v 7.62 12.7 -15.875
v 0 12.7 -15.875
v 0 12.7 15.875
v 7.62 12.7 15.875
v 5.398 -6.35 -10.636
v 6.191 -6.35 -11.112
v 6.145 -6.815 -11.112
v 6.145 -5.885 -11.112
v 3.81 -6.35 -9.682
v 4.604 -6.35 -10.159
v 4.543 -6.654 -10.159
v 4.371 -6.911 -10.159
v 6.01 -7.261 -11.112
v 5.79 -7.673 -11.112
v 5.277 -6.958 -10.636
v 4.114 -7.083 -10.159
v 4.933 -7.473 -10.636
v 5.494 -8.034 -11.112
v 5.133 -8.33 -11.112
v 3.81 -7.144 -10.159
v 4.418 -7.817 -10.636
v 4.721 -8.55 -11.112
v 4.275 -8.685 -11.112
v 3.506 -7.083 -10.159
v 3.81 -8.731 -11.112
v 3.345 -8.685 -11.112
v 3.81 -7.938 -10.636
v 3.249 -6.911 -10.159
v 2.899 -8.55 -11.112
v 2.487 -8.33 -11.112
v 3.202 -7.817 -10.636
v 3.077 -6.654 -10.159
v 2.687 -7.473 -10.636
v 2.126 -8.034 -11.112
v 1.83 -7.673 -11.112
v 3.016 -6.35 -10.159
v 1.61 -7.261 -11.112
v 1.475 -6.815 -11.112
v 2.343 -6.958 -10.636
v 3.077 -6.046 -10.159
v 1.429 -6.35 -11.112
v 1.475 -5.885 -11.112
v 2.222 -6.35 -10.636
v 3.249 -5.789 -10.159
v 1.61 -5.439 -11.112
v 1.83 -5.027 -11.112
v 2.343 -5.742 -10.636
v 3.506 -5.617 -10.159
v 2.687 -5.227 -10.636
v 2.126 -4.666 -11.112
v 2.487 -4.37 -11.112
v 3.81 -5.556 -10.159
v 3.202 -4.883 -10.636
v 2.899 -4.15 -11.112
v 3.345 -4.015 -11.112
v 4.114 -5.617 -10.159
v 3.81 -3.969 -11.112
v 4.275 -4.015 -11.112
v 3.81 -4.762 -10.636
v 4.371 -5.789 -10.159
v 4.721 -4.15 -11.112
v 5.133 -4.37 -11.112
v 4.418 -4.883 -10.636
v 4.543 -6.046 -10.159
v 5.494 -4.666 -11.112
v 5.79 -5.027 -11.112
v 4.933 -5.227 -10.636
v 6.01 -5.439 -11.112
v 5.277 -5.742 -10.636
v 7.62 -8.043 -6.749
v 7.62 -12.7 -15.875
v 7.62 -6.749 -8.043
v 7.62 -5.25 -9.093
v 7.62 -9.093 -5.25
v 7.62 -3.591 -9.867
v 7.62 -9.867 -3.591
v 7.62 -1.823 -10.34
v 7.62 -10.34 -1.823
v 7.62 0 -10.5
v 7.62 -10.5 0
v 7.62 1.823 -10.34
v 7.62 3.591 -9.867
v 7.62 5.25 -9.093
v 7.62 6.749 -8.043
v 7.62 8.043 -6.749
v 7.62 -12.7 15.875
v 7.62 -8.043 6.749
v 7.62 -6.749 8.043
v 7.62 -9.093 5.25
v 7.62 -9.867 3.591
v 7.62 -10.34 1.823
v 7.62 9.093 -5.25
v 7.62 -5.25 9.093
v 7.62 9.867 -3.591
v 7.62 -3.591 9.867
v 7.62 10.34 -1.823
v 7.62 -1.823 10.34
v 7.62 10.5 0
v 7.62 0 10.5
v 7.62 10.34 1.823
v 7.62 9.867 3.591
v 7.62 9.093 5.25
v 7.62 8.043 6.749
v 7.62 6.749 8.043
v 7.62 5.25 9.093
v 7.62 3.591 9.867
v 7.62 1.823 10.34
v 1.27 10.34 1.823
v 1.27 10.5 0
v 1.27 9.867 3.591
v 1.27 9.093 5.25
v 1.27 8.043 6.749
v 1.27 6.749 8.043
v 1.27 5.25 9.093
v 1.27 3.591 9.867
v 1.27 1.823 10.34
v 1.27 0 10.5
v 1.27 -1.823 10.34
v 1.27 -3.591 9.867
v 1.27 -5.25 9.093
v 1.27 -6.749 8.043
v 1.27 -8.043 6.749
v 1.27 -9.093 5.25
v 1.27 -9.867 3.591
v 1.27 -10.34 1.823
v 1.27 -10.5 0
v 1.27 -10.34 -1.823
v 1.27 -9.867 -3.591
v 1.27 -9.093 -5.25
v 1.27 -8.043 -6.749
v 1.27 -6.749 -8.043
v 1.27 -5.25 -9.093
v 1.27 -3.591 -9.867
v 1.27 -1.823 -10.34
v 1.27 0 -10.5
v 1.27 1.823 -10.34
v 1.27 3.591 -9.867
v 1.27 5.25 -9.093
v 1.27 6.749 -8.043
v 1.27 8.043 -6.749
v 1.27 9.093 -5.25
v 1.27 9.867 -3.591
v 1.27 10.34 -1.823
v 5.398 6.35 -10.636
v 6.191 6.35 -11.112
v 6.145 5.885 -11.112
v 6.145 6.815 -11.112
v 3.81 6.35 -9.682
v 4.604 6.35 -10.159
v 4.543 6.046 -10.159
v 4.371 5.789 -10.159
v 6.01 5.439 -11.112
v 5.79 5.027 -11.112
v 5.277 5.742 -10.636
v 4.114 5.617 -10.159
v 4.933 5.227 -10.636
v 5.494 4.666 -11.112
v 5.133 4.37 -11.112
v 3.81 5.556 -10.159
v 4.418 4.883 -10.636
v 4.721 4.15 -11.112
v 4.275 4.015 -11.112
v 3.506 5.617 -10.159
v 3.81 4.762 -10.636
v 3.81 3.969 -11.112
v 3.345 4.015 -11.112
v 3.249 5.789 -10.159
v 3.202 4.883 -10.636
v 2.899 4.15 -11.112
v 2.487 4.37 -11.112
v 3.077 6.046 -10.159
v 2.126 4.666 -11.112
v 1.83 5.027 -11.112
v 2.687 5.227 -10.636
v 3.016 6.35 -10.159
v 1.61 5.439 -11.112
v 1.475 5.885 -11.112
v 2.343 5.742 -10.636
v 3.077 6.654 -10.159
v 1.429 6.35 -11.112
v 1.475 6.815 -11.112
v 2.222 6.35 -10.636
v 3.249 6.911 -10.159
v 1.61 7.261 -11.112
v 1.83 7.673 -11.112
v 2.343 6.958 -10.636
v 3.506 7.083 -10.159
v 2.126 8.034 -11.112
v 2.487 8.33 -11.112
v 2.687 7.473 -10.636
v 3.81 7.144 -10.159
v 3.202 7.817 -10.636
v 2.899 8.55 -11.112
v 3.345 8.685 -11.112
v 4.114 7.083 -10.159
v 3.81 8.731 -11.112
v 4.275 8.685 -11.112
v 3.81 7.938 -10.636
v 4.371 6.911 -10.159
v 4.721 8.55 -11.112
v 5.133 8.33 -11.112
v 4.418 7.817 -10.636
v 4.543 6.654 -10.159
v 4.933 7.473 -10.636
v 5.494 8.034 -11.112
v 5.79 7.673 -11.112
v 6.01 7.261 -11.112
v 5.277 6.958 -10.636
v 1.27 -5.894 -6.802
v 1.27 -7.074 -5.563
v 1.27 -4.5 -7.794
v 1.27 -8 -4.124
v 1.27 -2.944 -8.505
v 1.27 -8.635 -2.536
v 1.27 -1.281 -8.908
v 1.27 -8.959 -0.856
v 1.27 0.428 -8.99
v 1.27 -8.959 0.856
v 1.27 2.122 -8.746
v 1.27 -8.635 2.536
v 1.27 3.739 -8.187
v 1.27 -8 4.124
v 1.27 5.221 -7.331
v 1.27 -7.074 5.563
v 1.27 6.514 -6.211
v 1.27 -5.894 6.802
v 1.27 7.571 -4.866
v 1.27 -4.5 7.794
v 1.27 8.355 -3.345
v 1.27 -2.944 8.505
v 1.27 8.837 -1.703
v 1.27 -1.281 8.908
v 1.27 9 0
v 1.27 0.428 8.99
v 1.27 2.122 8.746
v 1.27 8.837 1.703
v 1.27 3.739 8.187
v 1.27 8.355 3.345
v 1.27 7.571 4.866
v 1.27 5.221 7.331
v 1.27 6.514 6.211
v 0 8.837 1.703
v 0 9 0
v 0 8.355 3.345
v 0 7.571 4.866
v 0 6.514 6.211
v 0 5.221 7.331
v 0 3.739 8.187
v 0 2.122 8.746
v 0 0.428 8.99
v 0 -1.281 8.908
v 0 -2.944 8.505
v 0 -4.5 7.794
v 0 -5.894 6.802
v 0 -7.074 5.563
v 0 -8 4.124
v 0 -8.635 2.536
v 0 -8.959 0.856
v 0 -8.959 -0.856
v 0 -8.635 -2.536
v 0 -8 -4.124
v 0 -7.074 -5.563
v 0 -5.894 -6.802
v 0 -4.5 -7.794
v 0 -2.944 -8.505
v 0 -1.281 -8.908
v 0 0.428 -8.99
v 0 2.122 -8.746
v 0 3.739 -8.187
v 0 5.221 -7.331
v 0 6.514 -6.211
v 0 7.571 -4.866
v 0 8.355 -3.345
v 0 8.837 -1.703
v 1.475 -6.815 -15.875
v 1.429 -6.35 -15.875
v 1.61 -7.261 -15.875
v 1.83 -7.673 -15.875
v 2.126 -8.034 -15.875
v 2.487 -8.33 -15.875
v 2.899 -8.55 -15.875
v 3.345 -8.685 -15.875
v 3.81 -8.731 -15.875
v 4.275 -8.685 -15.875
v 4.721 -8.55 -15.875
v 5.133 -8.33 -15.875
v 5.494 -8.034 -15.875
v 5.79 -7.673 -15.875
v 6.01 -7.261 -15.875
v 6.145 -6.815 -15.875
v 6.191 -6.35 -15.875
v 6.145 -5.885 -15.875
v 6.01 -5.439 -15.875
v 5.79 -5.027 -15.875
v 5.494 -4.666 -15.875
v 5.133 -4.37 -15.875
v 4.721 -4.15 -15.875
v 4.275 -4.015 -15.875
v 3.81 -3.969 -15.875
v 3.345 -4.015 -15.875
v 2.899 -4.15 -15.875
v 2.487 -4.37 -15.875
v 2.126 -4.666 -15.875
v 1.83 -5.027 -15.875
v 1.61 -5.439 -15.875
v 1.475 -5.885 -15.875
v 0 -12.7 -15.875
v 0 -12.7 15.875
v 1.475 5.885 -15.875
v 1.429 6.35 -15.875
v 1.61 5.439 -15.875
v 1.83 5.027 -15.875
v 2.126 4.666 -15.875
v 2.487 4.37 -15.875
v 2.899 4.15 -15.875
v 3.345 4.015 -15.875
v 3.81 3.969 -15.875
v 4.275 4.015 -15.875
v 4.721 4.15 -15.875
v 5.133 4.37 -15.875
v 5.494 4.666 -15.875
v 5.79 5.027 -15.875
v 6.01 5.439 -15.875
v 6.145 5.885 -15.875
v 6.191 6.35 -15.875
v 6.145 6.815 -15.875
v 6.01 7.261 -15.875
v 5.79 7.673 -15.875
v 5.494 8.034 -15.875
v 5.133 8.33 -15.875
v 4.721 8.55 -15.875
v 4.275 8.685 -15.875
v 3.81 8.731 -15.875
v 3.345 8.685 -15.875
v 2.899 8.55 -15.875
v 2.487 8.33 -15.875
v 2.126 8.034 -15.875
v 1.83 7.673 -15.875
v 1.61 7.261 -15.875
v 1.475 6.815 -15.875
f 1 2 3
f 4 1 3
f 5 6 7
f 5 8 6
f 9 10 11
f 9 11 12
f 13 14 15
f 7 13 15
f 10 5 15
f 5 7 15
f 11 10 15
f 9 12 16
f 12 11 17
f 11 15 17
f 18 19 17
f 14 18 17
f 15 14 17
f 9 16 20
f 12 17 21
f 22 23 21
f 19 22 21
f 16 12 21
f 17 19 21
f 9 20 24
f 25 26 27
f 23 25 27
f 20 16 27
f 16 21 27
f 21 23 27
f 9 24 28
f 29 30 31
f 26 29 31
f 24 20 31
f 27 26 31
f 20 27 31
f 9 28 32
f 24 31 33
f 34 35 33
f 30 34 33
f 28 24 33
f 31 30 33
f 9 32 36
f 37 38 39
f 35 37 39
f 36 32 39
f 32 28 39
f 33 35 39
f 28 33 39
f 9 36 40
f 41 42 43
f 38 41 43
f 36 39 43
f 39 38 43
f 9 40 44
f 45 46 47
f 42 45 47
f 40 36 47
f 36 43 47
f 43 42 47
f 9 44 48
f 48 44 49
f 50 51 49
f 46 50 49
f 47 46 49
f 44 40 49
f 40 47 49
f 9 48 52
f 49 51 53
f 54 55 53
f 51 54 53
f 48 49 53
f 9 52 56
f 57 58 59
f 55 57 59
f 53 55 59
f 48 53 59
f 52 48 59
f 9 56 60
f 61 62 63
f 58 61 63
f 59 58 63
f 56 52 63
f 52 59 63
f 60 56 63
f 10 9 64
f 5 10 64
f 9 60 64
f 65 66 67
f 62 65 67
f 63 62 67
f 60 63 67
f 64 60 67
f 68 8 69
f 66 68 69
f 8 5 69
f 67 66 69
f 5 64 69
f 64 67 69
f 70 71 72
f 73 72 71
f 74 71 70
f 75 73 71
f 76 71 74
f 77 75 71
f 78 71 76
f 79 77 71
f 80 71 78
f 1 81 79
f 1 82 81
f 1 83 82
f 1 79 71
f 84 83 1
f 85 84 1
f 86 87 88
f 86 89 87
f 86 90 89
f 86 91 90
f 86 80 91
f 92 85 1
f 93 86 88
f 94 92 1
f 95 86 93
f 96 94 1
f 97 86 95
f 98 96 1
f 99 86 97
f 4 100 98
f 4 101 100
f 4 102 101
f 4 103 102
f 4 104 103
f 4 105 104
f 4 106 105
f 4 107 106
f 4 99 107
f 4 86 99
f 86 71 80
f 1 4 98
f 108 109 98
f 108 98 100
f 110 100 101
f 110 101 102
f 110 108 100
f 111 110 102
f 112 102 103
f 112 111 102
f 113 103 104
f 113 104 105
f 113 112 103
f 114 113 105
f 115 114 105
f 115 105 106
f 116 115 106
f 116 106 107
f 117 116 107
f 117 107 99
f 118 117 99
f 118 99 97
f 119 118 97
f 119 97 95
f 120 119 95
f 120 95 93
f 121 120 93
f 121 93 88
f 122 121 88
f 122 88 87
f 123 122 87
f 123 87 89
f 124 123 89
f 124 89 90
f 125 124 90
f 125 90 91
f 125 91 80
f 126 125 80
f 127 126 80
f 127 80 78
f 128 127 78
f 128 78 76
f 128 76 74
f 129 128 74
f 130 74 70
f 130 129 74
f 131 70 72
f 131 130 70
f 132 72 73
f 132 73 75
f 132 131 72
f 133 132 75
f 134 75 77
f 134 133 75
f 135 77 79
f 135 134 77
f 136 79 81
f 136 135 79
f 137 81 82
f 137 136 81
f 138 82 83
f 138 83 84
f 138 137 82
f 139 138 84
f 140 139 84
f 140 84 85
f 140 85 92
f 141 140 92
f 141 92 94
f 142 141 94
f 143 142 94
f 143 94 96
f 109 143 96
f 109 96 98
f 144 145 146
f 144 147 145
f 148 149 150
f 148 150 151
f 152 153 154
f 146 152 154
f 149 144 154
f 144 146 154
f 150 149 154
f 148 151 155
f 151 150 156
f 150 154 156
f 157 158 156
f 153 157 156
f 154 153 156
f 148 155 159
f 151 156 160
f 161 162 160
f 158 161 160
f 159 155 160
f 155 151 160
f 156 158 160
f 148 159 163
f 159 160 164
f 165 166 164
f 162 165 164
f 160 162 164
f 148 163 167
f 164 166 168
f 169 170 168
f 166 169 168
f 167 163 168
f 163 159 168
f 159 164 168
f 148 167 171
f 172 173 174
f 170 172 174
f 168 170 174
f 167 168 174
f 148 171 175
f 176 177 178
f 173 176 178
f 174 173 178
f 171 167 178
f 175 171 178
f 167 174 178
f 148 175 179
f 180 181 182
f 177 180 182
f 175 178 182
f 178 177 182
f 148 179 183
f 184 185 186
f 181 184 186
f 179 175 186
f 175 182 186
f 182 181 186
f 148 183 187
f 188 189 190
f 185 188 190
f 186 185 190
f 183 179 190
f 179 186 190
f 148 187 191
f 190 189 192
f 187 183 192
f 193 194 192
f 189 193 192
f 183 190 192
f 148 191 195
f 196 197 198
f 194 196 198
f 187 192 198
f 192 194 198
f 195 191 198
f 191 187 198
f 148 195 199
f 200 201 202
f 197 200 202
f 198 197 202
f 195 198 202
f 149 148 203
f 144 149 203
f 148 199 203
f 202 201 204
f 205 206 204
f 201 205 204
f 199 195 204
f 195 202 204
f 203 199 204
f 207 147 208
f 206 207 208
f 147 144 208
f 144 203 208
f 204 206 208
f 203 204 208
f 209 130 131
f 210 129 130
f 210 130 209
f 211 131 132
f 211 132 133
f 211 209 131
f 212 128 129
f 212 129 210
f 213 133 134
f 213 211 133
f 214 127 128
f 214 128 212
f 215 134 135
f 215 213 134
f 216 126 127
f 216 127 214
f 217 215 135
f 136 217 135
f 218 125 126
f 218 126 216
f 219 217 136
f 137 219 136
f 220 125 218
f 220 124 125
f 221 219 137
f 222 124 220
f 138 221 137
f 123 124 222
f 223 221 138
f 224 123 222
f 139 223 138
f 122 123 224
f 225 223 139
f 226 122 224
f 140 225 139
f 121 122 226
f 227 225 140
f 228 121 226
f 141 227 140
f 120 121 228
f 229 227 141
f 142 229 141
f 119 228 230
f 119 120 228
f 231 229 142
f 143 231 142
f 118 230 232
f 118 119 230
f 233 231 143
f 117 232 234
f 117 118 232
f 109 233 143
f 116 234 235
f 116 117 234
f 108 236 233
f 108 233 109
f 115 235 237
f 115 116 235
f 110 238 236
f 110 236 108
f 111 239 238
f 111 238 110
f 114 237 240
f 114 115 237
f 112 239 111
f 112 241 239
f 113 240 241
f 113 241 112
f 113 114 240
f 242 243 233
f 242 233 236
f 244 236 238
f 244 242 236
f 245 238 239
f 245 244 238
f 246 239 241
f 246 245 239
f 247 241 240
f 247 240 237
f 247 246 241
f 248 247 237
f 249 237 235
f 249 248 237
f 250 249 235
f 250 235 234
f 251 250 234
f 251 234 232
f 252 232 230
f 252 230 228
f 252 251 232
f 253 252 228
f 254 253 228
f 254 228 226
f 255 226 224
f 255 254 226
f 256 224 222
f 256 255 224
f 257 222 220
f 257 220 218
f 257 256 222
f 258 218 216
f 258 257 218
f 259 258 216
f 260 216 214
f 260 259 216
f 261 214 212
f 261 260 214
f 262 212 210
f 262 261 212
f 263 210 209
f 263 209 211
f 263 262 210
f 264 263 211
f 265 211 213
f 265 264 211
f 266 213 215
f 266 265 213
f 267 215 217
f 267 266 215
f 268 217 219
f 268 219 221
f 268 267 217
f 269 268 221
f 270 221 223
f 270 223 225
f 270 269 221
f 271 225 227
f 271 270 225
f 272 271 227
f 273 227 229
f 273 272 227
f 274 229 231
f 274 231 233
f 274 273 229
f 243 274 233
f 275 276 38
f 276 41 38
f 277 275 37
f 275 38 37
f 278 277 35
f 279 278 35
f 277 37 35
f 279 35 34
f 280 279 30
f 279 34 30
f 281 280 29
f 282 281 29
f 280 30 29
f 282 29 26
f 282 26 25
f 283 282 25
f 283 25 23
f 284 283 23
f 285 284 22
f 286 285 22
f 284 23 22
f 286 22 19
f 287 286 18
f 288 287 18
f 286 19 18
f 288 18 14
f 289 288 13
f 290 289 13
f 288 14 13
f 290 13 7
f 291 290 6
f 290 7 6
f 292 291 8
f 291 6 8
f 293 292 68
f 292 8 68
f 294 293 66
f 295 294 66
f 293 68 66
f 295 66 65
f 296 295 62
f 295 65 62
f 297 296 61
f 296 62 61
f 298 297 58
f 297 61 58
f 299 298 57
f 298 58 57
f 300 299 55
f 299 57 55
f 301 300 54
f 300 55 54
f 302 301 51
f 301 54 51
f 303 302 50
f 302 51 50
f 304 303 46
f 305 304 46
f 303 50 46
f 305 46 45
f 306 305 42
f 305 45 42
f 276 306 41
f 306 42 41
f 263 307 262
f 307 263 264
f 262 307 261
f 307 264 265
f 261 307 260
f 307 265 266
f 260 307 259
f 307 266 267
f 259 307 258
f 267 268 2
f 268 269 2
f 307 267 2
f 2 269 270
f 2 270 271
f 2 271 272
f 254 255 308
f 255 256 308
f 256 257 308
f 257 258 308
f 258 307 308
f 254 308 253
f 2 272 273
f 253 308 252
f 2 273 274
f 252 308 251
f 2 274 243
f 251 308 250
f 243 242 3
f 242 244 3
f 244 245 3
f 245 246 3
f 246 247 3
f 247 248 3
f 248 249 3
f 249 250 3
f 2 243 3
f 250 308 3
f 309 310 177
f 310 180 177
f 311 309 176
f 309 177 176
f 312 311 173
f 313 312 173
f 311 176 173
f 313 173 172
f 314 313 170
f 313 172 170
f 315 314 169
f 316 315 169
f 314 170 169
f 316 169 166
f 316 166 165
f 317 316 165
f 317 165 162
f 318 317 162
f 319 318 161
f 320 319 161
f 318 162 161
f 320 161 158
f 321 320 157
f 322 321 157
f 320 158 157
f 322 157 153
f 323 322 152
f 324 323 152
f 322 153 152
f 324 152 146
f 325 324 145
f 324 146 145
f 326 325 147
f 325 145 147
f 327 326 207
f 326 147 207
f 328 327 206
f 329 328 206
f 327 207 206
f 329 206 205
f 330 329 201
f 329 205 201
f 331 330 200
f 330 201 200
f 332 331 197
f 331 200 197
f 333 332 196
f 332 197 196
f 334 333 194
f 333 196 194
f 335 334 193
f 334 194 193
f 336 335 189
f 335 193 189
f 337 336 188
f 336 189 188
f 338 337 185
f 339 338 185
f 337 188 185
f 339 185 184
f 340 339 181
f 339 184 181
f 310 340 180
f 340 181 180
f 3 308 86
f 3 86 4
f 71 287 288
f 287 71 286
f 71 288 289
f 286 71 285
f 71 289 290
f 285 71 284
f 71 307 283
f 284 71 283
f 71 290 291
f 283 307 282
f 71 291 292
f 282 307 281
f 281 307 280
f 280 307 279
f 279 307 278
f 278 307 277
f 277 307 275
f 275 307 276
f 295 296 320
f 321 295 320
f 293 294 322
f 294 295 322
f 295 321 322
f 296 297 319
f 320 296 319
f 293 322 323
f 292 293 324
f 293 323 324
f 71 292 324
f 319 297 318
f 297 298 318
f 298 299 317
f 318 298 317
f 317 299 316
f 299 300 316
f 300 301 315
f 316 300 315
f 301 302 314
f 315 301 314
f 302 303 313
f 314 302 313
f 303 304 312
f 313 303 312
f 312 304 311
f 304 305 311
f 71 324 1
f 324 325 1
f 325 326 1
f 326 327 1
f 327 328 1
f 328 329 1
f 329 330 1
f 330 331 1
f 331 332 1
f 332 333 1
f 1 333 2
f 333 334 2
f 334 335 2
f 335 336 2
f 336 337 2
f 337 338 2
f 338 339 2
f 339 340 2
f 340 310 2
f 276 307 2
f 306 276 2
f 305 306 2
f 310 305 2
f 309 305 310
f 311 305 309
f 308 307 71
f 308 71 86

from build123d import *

# Parameters (mm, degrees)
F0_W     = 25.4
F0_H     = 31.75
F0_R     = 10.5
F1_DEPTH = 7.62
F3_D     = 4.7625
F3_DEPTH = 4.7625
F3_TIP   = 1.4307993491
F0_R_2   = 9
F4_DEPTH = 1.27


# Not quite as in the source:
# - a feature names something its author has since deleted; it is built from what else it names


with BuildPart() as f1:
    # F0 (on Right) → F1 (new body)
    with BuildSketch(Plane.YZ):
        Rectangle(F0_W, F0_H)
        Circle(F0_R, mode=Mode.SUBTRACT)
    extrude(amount=F1_DEPTH)

    # F3
    with Locations(Plane(origin=(0, 0, -15.875), x_dir=(1, 0, 0), z_dir=(0, 0, -1))):
        with Locations((3.81, 6.35), (3.81, -6.35)):
            Hole(F3_D / 2, depth=F3_DEPTH)
            with Locations((0, 0, -(F3_DEPTH + F3_TIP / 2))):  # 118° drill point
                Cone(0, F3_D / 2, F3_TIP, mode=Mode.SUBTRACT)

    # F0 (on Right) → F4 (join)
    with BuildSketch(Plane.YZ):
        Circle(F0_R)
        Circle(F0_R_2, mode=Mode.SUBTRACT)
    extrude(amount=F4_DEPTH)


solid = f1.part
